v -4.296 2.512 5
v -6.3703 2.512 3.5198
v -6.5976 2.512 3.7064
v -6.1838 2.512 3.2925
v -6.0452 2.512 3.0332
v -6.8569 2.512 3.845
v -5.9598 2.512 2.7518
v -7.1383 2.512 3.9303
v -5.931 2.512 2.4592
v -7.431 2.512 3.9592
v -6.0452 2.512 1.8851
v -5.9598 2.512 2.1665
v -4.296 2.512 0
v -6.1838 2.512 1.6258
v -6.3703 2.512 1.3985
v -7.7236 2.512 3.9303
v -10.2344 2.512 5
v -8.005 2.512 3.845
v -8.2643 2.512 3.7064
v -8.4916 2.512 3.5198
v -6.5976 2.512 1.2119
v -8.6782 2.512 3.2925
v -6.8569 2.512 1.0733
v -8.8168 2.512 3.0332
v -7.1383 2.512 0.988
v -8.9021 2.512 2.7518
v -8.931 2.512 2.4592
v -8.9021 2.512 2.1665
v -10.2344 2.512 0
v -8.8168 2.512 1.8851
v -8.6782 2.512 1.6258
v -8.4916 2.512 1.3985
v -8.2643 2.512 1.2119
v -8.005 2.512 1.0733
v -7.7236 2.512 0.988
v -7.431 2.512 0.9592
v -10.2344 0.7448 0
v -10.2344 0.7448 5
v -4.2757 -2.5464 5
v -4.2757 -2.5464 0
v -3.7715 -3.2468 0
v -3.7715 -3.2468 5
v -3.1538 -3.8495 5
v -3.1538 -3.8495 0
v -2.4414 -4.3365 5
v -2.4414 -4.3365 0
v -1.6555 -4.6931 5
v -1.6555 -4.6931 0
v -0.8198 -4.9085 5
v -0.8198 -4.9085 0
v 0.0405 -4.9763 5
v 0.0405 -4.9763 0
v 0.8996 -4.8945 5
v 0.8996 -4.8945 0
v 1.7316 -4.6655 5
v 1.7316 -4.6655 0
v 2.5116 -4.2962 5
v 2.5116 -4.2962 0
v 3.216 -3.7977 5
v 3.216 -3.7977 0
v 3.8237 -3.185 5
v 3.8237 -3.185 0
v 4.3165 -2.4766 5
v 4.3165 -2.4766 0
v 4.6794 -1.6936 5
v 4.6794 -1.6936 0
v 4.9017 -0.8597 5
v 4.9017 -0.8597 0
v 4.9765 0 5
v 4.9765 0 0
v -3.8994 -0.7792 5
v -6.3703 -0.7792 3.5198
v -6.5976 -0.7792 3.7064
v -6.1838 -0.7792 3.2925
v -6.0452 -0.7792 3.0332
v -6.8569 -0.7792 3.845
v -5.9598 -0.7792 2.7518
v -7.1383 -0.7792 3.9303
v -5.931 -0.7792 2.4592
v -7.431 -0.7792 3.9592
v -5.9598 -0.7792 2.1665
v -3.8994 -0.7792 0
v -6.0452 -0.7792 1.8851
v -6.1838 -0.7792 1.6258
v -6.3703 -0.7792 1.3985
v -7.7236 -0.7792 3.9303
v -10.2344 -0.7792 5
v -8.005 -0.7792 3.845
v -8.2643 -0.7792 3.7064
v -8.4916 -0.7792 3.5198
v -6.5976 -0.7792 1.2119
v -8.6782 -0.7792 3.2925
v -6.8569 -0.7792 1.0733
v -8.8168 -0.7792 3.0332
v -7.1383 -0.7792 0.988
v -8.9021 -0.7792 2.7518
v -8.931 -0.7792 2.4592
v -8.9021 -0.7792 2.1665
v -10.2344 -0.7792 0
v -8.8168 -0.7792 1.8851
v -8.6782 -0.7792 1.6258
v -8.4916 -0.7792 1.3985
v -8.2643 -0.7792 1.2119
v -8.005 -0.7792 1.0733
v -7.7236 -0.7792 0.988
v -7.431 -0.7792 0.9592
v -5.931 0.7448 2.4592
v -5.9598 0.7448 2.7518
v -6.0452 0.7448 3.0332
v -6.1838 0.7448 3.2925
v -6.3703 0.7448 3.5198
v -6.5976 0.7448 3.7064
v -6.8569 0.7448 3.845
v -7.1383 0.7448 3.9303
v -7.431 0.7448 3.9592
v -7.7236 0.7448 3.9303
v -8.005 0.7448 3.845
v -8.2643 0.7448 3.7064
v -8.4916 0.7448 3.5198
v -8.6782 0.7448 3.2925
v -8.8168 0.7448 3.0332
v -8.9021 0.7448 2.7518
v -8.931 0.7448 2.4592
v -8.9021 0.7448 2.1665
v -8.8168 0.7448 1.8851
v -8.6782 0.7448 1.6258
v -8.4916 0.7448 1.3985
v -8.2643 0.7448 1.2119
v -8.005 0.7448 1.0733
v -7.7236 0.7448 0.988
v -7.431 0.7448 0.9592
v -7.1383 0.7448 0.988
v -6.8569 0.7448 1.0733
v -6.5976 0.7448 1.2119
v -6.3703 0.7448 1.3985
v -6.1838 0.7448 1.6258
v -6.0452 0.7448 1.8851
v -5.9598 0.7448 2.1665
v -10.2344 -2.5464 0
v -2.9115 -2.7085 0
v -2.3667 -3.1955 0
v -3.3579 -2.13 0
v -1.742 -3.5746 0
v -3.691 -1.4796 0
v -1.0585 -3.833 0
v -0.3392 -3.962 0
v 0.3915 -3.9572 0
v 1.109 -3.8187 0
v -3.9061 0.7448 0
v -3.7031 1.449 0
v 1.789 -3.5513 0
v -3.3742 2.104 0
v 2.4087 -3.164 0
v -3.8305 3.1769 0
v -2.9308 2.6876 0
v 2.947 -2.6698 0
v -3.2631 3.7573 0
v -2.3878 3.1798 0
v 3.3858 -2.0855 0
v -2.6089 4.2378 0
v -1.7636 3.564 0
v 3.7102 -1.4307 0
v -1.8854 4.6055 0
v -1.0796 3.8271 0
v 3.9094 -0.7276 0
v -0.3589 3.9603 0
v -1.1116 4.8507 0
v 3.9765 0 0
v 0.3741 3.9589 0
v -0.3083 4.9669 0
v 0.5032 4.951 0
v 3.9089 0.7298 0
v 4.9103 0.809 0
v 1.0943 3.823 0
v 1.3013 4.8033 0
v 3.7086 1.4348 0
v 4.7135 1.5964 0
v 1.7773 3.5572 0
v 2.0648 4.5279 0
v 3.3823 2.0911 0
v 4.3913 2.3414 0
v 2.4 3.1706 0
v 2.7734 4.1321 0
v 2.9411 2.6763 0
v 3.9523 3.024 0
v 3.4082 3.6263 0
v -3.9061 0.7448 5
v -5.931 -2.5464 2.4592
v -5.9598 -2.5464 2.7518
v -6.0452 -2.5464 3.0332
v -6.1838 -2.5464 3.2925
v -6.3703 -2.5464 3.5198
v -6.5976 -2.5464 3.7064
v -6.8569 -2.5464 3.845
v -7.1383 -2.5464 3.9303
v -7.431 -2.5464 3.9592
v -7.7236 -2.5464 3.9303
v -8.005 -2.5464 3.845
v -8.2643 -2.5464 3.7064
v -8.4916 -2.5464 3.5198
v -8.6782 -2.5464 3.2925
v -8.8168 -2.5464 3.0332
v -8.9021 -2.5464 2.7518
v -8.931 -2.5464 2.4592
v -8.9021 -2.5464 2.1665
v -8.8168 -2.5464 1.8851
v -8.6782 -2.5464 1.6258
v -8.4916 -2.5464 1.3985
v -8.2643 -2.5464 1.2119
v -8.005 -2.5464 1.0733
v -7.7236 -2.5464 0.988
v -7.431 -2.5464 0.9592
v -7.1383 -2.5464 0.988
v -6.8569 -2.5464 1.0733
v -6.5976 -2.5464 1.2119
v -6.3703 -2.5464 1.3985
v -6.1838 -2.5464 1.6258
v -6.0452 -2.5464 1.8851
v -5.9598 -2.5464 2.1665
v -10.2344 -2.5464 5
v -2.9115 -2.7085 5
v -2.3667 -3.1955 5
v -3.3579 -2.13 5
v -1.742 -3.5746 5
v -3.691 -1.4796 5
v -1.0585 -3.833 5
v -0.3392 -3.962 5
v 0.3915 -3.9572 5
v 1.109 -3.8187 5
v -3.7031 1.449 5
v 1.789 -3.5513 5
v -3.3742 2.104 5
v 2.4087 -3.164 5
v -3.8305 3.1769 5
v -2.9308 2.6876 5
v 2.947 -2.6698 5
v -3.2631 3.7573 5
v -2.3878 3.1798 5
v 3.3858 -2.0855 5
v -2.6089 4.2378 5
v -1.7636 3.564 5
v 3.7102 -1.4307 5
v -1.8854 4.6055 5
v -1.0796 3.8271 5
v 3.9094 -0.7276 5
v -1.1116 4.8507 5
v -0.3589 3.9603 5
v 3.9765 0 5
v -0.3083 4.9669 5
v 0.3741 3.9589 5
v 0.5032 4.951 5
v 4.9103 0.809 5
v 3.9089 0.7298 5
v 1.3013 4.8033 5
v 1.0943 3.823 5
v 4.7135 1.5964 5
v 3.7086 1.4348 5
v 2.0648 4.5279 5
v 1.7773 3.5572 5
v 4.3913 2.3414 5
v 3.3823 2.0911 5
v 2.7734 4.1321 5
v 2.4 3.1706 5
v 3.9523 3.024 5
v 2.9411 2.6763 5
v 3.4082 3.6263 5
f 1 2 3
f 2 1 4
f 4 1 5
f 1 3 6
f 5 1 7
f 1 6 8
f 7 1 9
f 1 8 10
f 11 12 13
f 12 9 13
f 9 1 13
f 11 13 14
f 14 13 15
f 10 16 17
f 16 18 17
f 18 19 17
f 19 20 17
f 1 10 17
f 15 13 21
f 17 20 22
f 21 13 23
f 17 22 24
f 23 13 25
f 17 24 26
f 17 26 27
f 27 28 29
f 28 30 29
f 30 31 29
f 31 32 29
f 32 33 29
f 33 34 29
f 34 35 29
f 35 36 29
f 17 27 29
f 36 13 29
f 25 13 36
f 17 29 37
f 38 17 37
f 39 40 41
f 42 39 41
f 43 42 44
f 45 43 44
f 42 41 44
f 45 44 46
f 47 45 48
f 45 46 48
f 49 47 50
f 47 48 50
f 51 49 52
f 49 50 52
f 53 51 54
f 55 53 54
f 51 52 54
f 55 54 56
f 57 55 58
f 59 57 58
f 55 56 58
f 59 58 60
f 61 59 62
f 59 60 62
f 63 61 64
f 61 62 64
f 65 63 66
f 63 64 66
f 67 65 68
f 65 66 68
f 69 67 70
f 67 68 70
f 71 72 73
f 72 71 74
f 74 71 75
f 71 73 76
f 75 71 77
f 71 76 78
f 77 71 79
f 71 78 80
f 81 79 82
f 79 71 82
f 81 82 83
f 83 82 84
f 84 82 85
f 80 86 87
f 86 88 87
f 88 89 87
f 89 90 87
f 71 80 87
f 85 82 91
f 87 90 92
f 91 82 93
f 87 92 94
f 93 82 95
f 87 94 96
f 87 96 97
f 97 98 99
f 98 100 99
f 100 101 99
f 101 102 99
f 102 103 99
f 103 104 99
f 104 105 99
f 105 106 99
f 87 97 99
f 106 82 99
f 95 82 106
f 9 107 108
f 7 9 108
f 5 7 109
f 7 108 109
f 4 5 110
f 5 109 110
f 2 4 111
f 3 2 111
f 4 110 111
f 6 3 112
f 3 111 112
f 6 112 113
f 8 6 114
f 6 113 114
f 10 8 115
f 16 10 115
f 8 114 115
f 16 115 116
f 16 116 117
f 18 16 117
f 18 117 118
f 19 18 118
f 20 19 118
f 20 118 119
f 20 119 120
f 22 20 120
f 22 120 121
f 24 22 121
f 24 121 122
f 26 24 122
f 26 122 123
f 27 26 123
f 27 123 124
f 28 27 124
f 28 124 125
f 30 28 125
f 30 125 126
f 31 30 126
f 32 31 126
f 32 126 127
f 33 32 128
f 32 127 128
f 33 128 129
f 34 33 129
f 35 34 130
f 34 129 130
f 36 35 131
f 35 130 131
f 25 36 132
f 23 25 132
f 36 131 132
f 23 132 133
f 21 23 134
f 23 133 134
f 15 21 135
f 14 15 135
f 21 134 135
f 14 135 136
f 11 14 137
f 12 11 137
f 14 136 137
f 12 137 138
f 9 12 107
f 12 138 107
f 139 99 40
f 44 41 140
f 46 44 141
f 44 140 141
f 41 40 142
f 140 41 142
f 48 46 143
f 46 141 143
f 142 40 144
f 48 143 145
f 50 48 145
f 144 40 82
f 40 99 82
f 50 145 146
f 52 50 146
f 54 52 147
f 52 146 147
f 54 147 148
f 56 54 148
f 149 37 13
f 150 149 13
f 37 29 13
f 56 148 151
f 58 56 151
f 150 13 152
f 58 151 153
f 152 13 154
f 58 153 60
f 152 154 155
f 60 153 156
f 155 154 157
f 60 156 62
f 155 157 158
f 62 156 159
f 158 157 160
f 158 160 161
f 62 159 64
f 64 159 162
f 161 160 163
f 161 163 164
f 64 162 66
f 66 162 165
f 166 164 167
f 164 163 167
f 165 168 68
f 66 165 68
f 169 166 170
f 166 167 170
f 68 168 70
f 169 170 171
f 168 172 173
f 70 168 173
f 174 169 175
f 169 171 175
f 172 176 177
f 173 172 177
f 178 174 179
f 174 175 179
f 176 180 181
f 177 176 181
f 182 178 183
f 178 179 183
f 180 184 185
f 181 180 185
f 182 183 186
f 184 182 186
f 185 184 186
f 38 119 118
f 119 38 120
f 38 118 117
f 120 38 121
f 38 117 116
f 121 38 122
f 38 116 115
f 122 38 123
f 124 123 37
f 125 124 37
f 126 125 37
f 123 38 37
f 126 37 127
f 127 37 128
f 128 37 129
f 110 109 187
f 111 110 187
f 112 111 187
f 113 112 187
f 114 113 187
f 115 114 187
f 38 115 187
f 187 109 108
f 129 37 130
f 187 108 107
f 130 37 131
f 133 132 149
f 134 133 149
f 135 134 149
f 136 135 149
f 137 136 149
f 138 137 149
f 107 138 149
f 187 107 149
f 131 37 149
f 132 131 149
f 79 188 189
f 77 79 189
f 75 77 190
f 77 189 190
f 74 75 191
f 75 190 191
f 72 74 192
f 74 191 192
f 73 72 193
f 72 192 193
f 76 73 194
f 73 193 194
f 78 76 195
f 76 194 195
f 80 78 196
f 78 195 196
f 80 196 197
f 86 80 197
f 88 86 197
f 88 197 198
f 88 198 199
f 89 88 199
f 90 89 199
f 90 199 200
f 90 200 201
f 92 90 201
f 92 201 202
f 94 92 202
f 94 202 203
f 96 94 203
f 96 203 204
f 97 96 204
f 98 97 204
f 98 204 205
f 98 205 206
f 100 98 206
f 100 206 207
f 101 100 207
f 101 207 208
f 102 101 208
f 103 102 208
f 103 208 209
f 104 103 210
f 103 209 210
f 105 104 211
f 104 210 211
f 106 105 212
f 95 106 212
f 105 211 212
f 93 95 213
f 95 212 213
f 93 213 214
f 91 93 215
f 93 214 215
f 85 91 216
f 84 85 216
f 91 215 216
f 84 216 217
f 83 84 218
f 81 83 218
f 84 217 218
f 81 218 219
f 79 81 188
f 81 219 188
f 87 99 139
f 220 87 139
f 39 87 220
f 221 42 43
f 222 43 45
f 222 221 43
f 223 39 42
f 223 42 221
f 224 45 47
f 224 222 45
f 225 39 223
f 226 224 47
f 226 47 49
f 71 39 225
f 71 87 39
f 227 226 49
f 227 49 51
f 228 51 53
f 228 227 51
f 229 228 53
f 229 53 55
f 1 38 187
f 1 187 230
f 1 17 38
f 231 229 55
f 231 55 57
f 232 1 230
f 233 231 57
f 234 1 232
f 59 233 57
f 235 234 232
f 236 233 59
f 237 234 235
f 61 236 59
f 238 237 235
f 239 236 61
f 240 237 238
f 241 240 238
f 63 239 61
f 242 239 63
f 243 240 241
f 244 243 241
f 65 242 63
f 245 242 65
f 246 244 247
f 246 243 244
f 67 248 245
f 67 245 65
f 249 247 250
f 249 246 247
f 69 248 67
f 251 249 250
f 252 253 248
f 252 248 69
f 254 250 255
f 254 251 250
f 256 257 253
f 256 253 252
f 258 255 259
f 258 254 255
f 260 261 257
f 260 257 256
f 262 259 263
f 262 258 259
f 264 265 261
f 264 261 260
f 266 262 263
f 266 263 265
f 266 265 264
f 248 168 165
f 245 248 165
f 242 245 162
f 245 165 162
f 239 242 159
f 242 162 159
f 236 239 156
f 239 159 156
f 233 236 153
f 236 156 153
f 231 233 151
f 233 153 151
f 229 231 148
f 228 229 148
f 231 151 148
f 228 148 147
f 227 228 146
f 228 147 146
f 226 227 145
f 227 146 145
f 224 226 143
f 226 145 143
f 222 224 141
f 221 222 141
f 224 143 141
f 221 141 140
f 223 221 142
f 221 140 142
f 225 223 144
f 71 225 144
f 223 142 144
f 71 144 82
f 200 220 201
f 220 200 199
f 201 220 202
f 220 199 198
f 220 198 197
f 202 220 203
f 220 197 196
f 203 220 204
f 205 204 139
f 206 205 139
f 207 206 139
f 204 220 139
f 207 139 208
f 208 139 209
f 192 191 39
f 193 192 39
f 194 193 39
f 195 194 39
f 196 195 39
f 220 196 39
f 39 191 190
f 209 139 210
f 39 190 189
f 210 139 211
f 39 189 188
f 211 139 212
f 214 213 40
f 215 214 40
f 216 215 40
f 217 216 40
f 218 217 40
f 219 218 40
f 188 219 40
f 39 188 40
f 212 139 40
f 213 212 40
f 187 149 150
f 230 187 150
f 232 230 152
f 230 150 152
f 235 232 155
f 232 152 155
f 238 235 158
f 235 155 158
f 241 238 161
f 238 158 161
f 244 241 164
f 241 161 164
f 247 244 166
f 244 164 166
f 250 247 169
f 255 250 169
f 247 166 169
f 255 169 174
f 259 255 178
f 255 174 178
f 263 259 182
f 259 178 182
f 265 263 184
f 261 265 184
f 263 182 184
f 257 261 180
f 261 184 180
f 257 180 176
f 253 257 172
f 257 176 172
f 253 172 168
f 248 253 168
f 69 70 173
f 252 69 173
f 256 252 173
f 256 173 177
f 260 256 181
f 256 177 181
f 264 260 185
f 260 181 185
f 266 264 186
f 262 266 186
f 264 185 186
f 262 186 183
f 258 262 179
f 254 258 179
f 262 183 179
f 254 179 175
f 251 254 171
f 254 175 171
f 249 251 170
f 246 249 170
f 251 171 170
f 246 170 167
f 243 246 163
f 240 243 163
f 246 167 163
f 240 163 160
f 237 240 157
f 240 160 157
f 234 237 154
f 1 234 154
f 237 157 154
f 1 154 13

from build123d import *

# Parameters (mm, degrees)
F1_DEPTH = 5
F2_R     = 1.5
F3_DEPTH = 25.4


with BuildPart() as f1:
    # F0 (on Top) → F1 (new body)
    with BuildSketch(Plane.XY):
        with BuildLine():
            Line((-10.2344341576, 0.7447922041), (-4.9204421579, 0.7447922041))
            ThreePointArc((-4.9204421579, 0.7447922041), (-4.6921521255, 1.6580635959), (-4.2959631379, 2.5120046127))
            Line((-4.2959631379, 2.5120046127), (-10.2344341576, 2.5120046127))
            Line((-10.2344341576, 2.5120046127), (-10.2344341576, 0.7447922041))
        make_face()
        with BuildLine():
            ThreePointArc((-4.2756532365, -2.5464202045), (-4.6795608737, -1.6932738958), (-4.9151095275, -0.7792077959))
            Line((-4.9151095275, -0.7792077959), (-10.2344341576, -0.7792077959))
            Line((-10.2344341576, -0.7792077959), (-10.2344341576, -2.5464202045))
            Line((-10.2344341576, -2.5464202045), (-4.2756532365, -2.5464202045))
        make_face()
        with BuildLine():
            ThreePointArc((-3.9061193363, 0.7447922041), (0.3740546925, 3.9588592781), (3.9764913802, 0))
            ThreePointArc((3.9764913802, 0), (0.391506034, -3.9571715558), (-3.8993998137, -0.7792077959))
            Line((-3.8993998137, -0.7792077959), (-4.9151095275, -0.7792077959))
            ThreePointArc((-4.9151095275, -0.7792077959), (-4.6795608737, -1.6932738958), (-4.2756532365, -2.5464202045))
            ThreePointArc((-4.2756532365, -2.5464202045), (1.3205519643, -4.7980838849), (4.9764913802, 0))
            ThreePointArc((4.9764913802, 0), (1.3012768598, 4.8033472695), (-4.2959631379, 2.5120046127))
            ThreePointArc((-4.2959631379, 2.5120046127), (-4.6921521255, 1.6580635959), (-4.9204421579, 0.7447922041))
            Line((-4.9204421579, 0.7447922041), (-3.9061193363, 0.7447922041))
        make_face()
    extrude(amount=F1_DEPTH)

    # F2 (on face) → F3 (cut)
    with BuildSketch(Plane.XZ.offset(2.5464202045)):
        with Locations((-7.4309720658, 2.4591526017)):
            Circle(F2_R)
    extrude(amount=-F3_DEPTH, mode=Mode.SUBTRACT)


solid = f1.part
